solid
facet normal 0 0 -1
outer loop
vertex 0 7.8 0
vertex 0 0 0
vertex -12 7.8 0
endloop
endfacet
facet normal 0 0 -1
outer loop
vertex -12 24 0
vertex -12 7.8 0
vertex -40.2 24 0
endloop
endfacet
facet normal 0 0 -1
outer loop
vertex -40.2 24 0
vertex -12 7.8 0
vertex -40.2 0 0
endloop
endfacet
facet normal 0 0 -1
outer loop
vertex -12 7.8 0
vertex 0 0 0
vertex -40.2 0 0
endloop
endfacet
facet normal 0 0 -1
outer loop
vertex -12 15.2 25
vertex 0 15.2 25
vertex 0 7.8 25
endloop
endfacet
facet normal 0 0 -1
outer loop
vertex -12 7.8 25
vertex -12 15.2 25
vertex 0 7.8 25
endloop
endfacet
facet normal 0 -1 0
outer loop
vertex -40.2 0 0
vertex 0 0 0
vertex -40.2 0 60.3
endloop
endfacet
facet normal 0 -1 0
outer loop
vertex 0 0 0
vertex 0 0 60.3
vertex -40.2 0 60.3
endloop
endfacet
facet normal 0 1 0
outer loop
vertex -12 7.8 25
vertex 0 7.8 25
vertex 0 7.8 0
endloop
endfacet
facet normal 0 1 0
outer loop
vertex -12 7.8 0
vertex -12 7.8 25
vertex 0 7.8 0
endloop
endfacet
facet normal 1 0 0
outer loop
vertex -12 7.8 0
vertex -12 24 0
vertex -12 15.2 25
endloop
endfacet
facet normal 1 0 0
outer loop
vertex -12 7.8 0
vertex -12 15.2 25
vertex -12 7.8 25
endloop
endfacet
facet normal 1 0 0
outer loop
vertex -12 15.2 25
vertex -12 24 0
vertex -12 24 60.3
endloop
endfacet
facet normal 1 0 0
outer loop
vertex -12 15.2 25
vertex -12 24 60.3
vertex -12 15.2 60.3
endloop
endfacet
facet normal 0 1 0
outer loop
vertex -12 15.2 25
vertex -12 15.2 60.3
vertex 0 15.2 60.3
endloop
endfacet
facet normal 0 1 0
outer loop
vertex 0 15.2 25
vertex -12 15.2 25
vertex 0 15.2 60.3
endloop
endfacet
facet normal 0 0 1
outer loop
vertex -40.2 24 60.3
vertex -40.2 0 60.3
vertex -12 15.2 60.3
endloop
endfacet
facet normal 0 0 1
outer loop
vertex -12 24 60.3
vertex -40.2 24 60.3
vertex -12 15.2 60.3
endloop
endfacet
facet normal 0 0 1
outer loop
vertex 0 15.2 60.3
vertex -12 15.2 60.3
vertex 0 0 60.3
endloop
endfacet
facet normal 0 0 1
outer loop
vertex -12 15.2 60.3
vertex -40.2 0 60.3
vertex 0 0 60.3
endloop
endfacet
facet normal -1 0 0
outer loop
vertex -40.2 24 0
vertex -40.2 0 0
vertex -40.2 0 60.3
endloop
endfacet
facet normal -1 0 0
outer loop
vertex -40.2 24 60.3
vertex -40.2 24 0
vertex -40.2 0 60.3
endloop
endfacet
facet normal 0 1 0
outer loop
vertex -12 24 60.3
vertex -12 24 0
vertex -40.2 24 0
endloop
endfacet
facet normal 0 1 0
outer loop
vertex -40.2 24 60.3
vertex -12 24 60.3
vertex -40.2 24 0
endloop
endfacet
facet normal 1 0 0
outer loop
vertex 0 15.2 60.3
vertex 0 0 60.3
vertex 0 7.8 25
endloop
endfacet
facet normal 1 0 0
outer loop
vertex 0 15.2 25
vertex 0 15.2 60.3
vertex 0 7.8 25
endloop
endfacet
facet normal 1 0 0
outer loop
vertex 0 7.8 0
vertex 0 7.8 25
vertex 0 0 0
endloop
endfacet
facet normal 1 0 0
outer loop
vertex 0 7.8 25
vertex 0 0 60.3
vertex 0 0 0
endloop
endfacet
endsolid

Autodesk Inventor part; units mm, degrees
ref_plane "YZ Plane" through (0, 0, 0) normal (1, 0, 0) x (0, 1, 0)
ref_plane "XZ Plane" through (0, 0, 0) normal (0, 1, 0) x (-1, 0, 0)
ref_plane "XY Plane" through (0, 0, 0) normal (0, 0, 1) x (1, 0, 0)
sketch "Sketch1" plane through (0, 0, 0) normal (0, 1, 0) x (-1, 0, 0)
  line L0 (0, 0) -> (40.2, 0)
  line L1 (40.2, 0) -> (40.2, 60.3)
  line L2 (40.2, 60.3) -> (0, 60.3)
  line L3 (0, 60.3) -> (0, 0)
  dimension "d0" = 60.3
  dimension "d1" = 40.2
extrude "Extrusion1" add sketch "Sketch1" along normal blind 24
sketch "Sketch2" plane through (-40.2, 0, 60.3) normal (0, 0, 1) x (1, 0, 0)
  line L0 (0, 0) -> (40.2, 0) projected
  line L1 (40.2, 0) -> (40.2, 24) projected
  line L2 (0, 24) -> (40.2, 24) projected
  line L3 (0, 0) -> (0, 24) projected
  line L4 (40.2, 24) -> (28.2, 24)
  line L5 (28.2, 24) -> (28.2, 15.2)
  line L6 (28.2, 15.2) -> (40.2, 15.2)
  line L7 (40.2, 15.2) -> (40.2, 24)
  point P0 (40.2, 0)
  point P1 (28.2, 24)
  dimension "d4" = 12
  dimension "d5" = 8.8
extrude "Extrusion2" cut sketch "Sketch2" against normal through all contours L6 L5 L2 L1
sketch "Sketch3" plane through (0, 0, 60.3) normal (1, 0, 0) x (0, 0, -1)
  line L0 (60.3, 15.2) -> (0, 15.2) projected
  line L1 (0, 0) -> (0, 15.2) projected
  line L2 (0, 0) -> (60.3, 0) projected
  line L3 (60.3, 0) -> (60.3, 15.2) projected
  line L4 (60.3, 15.2) -> (35.3, 15.2)
  line L5 (35.3, 15.2) -> (35.3, 7.8)
  line L6 (35.3, 7.8) -> (60.3, 7.8)
  line L7 (60.3, 7.8) -> (60.3, 15.2)
  dimension "d8" = 25
  dimension "d9" = 7.4
extrude "Extrusion3" cut sketch "Sketch3" against normal up to surface (12 mm away) contours L3 L6 L5 L0
properties part number "New Board"
